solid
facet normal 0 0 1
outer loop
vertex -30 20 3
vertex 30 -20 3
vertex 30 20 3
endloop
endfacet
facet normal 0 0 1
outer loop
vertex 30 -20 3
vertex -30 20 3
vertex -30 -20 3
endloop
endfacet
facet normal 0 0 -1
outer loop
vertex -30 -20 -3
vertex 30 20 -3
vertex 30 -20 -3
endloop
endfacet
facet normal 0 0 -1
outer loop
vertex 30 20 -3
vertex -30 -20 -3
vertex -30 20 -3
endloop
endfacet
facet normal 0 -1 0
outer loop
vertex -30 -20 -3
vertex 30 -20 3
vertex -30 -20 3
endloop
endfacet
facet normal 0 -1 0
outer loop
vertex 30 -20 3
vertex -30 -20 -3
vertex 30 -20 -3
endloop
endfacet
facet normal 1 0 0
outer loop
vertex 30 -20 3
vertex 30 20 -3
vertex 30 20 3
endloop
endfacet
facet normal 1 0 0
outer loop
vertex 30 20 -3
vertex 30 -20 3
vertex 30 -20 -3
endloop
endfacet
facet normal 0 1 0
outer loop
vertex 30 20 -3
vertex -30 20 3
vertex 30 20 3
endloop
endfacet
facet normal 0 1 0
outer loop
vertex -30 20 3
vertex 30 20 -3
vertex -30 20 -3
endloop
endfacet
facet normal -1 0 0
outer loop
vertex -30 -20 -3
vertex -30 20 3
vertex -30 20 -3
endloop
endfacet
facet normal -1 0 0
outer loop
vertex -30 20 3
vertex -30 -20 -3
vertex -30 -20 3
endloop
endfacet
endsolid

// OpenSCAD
// Starter file for task-014.
// Edit this file in OpenSCAD to complete the requested hard task.
$fn = 64;

base_w = 60;
base_d = 40;
base_t = 6;
cube([base_w, base_d, base_t], center=true);
